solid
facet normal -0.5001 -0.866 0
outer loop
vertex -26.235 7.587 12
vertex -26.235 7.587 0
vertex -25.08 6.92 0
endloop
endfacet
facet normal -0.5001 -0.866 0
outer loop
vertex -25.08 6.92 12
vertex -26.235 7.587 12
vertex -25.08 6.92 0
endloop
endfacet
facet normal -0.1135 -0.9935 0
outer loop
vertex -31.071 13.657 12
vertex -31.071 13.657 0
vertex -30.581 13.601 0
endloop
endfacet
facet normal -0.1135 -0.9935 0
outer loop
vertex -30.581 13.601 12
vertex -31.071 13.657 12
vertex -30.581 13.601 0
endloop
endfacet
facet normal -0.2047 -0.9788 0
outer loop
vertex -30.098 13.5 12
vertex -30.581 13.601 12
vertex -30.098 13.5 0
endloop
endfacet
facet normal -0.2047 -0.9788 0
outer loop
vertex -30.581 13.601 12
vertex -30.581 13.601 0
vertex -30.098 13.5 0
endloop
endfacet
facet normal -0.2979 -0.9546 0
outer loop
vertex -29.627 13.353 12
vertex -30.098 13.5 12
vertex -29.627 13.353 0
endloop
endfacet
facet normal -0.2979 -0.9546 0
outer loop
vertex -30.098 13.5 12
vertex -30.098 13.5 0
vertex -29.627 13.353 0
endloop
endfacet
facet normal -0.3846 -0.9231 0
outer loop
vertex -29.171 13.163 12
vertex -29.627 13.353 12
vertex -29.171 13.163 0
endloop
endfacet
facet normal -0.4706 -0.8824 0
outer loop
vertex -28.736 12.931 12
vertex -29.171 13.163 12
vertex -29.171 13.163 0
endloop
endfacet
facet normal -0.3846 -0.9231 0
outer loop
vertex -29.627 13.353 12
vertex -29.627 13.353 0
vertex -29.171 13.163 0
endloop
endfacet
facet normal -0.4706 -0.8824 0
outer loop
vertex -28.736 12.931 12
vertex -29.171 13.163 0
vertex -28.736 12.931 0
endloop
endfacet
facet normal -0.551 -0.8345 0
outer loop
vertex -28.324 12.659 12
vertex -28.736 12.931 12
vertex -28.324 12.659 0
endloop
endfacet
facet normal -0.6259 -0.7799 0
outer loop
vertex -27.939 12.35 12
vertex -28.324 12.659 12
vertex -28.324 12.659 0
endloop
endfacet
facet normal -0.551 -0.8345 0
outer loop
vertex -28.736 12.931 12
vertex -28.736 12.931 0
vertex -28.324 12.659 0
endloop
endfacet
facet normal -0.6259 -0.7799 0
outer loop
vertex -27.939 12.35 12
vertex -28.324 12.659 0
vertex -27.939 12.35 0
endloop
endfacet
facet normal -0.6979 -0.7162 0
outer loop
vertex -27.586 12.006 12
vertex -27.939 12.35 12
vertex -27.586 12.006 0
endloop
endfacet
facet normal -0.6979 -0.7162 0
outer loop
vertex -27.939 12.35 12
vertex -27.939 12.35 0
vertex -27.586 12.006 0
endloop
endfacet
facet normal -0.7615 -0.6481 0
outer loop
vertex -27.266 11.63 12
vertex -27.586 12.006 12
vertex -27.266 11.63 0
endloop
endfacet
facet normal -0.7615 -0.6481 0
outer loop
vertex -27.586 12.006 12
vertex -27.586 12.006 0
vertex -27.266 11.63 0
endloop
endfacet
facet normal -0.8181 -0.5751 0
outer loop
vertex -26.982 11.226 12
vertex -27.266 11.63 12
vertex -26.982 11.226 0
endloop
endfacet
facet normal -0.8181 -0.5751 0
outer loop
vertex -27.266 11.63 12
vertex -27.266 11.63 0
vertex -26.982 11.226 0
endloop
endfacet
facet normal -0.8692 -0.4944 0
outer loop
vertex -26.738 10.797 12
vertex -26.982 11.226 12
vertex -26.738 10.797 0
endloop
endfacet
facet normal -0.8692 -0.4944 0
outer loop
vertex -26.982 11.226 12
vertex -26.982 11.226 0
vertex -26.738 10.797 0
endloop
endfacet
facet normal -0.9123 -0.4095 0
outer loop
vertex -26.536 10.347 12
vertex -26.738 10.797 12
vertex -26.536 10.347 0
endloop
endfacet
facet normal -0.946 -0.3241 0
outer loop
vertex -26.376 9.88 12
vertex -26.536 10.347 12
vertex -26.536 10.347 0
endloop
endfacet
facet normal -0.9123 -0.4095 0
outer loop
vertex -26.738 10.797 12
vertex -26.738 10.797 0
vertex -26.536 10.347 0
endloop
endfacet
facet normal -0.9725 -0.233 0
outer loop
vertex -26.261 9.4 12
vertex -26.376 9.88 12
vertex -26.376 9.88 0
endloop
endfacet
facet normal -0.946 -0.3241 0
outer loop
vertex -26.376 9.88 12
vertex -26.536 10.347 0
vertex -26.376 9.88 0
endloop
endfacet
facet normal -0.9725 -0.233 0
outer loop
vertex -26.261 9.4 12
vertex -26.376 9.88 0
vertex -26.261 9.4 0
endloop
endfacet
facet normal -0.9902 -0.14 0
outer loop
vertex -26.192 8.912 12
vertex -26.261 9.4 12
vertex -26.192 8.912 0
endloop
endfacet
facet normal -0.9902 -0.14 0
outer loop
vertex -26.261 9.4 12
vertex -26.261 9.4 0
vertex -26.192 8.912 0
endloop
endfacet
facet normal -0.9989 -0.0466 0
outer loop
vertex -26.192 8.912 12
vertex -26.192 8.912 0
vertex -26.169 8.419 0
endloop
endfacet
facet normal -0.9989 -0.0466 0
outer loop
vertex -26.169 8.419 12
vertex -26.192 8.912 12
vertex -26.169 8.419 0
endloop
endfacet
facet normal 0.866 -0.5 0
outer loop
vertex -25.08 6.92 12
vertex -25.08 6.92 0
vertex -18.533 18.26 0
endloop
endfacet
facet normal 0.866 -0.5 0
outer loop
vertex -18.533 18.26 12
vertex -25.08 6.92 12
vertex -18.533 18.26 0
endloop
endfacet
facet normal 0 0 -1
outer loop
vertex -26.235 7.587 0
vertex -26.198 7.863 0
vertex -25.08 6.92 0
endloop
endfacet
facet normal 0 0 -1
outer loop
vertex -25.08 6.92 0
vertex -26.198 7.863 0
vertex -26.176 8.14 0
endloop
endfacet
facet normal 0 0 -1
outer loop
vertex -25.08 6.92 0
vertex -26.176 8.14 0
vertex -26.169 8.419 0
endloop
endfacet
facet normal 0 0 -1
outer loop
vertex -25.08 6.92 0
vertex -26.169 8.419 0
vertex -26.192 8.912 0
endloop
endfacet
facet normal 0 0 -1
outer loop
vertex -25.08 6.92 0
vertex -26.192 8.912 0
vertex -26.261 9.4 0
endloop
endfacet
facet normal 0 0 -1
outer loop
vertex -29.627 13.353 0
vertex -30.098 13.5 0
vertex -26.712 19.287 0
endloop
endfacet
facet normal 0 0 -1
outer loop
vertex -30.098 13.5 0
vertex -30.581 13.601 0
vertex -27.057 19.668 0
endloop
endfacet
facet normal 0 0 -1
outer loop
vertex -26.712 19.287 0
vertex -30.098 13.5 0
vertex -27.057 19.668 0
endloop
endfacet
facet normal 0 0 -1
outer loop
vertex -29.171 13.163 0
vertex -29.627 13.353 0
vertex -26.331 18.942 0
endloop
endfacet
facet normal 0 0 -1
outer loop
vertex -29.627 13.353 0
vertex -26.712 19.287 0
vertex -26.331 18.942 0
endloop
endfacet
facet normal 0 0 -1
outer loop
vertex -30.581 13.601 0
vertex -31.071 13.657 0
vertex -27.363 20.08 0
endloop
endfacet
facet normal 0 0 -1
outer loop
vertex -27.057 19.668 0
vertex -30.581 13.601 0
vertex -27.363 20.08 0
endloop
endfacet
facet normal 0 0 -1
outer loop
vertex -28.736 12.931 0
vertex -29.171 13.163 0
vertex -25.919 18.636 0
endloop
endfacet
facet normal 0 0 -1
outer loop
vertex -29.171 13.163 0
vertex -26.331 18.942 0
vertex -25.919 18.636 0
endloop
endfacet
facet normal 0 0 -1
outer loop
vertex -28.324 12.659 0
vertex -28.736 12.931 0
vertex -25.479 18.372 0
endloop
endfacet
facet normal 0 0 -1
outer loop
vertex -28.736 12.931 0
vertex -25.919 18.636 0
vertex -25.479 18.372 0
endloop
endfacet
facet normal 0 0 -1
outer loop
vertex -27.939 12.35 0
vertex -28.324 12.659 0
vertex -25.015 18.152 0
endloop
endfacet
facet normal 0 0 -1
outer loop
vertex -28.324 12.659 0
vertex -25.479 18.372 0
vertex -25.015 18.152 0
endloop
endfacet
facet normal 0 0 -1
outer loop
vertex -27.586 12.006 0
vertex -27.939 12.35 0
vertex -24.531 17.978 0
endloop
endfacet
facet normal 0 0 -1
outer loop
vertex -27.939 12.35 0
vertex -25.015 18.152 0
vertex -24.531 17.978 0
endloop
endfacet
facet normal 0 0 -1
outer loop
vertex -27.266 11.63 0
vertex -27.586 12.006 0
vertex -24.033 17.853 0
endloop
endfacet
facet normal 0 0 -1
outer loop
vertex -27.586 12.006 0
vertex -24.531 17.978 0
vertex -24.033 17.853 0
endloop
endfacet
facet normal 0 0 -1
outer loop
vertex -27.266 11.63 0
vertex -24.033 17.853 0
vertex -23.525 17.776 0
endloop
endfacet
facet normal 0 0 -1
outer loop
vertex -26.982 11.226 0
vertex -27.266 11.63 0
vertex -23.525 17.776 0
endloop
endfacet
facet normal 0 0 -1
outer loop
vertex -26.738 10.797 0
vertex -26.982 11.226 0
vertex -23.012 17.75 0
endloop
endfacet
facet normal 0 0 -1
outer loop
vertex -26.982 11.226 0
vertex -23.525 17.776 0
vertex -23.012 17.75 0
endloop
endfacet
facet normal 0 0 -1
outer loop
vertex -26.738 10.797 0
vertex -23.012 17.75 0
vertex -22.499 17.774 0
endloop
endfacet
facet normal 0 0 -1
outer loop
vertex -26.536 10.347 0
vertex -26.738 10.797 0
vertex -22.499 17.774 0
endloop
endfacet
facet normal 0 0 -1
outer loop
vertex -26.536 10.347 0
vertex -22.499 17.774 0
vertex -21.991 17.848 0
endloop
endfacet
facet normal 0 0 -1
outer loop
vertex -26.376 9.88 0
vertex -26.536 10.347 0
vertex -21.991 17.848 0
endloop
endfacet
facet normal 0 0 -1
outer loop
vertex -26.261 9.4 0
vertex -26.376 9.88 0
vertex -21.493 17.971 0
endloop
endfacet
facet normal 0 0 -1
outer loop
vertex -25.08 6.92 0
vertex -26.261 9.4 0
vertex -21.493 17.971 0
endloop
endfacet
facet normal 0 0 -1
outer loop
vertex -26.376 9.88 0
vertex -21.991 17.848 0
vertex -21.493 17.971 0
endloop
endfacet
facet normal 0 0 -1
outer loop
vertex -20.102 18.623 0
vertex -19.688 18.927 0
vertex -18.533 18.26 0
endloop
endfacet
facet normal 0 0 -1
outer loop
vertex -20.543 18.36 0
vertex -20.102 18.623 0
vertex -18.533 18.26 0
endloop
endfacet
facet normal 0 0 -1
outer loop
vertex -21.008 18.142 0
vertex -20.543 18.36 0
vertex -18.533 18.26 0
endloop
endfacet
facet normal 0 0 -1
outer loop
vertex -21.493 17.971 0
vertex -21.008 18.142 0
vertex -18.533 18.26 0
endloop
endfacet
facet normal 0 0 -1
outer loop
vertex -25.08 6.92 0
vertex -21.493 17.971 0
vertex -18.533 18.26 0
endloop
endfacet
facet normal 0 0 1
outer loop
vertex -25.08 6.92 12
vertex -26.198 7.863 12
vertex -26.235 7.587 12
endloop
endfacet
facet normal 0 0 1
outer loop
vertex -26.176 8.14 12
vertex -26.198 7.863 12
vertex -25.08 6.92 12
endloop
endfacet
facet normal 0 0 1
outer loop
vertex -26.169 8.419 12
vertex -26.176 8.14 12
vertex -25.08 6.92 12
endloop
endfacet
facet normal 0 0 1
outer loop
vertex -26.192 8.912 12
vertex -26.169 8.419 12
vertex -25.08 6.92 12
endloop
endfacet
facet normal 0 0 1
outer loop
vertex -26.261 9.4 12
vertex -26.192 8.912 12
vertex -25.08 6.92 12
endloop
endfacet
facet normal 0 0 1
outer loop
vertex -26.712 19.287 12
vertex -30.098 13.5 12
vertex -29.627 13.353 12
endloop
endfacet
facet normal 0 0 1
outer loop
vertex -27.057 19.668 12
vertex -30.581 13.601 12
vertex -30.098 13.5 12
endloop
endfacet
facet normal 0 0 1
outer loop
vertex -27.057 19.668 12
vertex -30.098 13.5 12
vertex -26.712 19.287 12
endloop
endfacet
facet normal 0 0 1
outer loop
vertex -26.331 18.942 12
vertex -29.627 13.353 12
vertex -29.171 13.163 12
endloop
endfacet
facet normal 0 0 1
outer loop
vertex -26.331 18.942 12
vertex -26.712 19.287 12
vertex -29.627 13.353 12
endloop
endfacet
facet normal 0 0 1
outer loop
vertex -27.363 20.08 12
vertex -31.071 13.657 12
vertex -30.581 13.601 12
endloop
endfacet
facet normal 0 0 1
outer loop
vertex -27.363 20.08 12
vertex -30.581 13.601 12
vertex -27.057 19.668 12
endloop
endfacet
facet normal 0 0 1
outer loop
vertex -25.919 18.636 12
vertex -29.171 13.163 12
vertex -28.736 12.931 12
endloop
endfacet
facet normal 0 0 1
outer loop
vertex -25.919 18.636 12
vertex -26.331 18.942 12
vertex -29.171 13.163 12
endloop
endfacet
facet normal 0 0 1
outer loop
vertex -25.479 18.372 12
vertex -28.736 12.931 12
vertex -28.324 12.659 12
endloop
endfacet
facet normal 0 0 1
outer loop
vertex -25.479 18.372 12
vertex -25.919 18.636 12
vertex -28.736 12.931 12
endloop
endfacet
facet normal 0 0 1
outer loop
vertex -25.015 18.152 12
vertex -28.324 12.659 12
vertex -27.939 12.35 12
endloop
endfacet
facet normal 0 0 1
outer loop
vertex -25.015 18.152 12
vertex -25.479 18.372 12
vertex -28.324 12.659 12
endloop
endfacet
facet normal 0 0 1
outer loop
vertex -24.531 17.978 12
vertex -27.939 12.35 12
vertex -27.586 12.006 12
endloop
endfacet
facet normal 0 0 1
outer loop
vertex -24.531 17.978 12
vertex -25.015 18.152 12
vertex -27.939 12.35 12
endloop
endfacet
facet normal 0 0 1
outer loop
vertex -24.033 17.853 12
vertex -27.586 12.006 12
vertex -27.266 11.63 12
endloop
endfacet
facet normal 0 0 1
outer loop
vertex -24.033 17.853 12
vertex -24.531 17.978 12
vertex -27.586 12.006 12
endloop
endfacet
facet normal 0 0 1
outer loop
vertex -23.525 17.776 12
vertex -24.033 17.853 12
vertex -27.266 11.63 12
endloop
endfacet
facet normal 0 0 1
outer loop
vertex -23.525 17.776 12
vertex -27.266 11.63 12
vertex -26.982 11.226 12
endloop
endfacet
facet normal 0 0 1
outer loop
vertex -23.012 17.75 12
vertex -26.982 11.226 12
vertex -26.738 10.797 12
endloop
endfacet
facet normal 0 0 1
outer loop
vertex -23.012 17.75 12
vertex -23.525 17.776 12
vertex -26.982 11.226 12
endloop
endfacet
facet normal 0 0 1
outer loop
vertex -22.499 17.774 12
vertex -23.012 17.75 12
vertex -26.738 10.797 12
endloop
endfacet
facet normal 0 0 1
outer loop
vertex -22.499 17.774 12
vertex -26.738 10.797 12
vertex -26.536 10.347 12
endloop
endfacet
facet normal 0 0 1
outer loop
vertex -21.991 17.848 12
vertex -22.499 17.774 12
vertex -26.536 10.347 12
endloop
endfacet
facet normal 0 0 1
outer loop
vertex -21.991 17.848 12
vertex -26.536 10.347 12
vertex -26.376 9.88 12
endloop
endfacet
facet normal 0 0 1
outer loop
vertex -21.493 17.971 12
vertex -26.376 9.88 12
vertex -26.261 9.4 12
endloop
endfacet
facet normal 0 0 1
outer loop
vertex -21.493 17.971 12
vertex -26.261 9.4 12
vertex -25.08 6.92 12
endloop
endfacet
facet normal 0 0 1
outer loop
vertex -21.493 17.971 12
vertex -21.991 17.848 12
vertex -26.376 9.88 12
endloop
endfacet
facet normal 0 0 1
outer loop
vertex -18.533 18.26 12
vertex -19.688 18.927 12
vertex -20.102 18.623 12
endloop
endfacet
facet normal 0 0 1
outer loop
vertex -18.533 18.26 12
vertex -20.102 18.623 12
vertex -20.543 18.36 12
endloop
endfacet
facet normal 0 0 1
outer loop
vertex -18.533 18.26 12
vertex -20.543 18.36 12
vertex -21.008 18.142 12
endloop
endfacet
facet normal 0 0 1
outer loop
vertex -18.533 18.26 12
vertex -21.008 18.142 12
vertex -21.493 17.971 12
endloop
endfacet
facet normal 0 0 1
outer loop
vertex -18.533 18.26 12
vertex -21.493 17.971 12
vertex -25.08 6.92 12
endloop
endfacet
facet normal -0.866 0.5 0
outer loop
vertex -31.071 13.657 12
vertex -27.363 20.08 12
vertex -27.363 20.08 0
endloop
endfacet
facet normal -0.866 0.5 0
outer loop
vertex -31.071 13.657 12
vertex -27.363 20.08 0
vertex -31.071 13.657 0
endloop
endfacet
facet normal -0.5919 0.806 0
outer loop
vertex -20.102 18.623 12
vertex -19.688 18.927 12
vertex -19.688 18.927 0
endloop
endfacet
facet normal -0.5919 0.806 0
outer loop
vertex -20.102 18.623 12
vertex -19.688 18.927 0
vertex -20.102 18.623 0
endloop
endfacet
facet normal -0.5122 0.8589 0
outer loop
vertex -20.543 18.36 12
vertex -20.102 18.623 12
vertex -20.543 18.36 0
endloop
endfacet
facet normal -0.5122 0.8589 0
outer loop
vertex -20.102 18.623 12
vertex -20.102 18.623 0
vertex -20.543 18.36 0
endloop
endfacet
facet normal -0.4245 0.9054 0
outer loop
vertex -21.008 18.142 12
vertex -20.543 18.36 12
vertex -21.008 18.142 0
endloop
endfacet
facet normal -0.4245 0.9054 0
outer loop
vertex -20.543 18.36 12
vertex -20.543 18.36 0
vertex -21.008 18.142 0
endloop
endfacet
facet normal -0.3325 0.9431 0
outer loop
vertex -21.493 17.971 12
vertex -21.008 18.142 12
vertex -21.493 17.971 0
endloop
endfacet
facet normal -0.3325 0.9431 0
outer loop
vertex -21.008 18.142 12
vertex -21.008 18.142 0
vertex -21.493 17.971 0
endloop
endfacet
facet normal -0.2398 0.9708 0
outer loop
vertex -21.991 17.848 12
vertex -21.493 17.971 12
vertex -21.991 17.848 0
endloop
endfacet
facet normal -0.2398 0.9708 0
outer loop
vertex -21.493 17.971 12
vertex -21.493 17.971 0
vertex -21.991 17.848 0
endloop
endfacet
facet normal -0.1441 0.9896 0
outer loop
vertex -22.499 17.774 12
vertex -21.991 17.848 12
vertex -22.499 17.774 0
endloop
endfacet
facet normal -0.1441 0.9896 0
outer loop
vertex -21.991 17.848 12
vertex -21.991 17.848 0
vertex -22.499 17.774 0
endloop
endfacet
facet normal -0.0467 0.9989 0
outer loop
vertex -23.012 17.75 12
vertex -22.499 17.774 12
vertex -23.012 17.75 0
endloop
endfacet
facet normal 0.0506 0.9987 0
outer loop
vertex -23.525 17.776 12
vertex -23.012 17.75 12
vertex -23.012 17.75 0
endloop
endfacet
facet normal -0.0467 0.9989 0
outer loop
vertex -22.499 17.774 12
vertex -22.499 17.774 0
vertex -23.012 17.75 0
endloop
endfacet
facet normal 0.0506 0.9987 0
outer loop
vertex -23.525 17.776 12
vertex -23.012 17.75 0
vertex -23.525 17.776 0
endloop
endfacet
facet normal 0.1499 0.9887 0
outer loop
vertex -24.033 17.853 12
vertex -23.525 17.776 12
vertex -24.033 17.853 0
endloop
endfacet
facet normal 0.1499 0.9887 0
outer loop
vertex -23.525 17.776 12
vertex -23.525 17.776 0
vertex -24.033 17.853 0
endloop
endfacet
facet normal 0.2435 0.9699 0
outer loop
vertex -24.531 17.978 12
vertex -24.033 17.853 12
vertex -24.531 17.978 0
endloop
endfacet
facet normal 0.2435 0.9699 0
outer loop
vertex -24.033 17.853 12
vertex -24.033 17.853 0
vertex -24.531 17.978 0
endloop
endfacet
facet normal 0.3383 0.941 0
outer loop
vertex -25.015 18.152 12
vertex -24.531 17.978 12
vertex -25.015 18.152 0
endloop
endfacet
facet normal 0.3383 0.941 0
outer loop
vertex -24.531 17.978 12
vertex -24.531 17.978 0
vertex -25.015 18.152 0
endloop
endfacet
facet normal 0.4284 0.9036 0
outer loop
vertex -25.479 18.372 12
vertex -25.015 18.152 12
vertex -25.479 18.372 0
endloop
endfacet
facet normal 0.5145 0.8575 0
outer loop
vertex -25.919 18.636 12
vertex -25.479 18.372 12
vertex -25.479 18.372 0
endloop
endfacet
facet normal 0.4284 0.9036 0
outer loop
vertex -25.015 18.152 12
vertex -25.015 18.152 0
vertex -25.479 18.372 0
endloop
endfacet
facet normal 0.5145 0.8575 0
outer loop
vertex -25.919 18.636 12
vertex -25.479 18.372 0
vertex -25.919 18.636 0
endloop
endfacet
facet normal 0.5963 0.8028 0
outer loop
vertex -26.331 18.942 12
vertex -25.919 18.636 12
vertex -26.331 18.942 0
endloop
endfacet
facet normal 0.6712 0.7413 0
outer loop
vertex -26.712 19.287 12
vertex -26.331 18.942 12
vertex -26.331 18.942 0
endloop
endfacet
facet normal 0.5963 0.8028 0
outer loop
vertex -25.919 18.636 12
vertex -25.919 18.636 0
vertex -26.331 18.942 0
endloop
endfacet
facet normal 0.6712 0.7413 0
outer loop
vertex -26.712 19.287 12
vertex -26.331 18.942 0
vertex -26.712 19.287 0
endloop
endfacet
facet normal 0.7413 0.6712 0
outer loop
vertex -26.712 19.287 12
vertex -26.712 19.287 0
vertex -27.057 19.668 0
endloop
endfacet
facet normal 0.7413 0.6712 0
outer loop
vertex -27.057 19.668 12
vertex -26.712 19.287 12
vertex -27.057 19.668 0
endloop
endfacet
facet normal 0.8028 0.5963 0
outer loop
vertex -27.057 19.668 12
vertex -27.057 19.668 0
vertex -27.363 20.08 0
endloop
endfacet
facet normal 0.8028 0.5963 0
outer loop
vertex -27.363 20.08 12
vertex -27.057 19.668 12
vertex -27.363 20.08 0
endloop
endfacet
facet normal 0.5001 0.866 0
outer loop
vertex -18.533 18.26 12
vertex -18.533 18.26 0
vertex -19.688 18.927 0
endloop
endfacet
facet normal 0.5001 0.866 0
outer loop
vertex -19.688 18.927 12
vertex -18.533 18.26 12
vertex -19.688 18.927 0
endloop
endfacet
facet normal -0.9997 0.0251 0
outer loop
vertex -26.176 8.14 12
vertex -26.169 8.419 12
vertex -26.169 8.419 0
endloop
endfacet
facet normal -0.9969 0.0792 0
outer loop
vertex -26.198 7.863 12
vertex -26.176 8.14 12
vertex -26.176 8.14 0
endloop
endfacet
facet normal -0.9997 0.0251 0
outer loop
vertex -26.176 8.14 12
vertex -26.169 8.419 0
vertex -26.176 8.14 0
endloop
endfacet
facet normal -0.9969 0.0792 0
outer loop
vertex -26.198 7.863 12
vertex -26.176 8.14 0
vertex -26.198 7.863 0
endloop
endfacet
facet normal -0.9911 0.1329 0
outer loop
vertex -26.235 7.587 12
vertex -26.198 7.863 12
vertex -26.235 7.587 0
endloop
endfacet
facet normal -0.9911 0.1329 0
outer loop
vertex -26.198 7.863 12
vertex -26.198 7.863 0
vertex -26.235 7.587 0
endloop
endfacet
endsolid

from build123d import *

# Parameters (mm, degrees)
F1_DEPTH = 12


with BuildPart() as f1:
    # F0 (on Top) → F1 (new body)
    with BuildSketch(Plane.XY):
        with BuildLine():
            ThreePointArc((-19.687827, 18.926671), (-23.780217, 17.808299), (-27.363122, 20.080126))
            Line((-27.363122, 20.080126), (-31.07146, 13.657096))
            ThreePointArc((-31.07146, 13.657096), (-27.585511, 12.006069), (-26.168584, 8.418584))
            ThreePointArc((-26.168584, 8.418584), (-26.185187, 8.001384), (-26.234891, 7.586823))
            Line((-26.234891, 7.586823), (-25.080382, 6.920266))
            Line((-25.080382, 6.920266), (-18.533317, 18.260114))
            Line((-18.533317, 18.260114), (-19.687827, 18.926671))
        make_face()
    extrude(amount=F1_DEPTH)


solid = f1.part
